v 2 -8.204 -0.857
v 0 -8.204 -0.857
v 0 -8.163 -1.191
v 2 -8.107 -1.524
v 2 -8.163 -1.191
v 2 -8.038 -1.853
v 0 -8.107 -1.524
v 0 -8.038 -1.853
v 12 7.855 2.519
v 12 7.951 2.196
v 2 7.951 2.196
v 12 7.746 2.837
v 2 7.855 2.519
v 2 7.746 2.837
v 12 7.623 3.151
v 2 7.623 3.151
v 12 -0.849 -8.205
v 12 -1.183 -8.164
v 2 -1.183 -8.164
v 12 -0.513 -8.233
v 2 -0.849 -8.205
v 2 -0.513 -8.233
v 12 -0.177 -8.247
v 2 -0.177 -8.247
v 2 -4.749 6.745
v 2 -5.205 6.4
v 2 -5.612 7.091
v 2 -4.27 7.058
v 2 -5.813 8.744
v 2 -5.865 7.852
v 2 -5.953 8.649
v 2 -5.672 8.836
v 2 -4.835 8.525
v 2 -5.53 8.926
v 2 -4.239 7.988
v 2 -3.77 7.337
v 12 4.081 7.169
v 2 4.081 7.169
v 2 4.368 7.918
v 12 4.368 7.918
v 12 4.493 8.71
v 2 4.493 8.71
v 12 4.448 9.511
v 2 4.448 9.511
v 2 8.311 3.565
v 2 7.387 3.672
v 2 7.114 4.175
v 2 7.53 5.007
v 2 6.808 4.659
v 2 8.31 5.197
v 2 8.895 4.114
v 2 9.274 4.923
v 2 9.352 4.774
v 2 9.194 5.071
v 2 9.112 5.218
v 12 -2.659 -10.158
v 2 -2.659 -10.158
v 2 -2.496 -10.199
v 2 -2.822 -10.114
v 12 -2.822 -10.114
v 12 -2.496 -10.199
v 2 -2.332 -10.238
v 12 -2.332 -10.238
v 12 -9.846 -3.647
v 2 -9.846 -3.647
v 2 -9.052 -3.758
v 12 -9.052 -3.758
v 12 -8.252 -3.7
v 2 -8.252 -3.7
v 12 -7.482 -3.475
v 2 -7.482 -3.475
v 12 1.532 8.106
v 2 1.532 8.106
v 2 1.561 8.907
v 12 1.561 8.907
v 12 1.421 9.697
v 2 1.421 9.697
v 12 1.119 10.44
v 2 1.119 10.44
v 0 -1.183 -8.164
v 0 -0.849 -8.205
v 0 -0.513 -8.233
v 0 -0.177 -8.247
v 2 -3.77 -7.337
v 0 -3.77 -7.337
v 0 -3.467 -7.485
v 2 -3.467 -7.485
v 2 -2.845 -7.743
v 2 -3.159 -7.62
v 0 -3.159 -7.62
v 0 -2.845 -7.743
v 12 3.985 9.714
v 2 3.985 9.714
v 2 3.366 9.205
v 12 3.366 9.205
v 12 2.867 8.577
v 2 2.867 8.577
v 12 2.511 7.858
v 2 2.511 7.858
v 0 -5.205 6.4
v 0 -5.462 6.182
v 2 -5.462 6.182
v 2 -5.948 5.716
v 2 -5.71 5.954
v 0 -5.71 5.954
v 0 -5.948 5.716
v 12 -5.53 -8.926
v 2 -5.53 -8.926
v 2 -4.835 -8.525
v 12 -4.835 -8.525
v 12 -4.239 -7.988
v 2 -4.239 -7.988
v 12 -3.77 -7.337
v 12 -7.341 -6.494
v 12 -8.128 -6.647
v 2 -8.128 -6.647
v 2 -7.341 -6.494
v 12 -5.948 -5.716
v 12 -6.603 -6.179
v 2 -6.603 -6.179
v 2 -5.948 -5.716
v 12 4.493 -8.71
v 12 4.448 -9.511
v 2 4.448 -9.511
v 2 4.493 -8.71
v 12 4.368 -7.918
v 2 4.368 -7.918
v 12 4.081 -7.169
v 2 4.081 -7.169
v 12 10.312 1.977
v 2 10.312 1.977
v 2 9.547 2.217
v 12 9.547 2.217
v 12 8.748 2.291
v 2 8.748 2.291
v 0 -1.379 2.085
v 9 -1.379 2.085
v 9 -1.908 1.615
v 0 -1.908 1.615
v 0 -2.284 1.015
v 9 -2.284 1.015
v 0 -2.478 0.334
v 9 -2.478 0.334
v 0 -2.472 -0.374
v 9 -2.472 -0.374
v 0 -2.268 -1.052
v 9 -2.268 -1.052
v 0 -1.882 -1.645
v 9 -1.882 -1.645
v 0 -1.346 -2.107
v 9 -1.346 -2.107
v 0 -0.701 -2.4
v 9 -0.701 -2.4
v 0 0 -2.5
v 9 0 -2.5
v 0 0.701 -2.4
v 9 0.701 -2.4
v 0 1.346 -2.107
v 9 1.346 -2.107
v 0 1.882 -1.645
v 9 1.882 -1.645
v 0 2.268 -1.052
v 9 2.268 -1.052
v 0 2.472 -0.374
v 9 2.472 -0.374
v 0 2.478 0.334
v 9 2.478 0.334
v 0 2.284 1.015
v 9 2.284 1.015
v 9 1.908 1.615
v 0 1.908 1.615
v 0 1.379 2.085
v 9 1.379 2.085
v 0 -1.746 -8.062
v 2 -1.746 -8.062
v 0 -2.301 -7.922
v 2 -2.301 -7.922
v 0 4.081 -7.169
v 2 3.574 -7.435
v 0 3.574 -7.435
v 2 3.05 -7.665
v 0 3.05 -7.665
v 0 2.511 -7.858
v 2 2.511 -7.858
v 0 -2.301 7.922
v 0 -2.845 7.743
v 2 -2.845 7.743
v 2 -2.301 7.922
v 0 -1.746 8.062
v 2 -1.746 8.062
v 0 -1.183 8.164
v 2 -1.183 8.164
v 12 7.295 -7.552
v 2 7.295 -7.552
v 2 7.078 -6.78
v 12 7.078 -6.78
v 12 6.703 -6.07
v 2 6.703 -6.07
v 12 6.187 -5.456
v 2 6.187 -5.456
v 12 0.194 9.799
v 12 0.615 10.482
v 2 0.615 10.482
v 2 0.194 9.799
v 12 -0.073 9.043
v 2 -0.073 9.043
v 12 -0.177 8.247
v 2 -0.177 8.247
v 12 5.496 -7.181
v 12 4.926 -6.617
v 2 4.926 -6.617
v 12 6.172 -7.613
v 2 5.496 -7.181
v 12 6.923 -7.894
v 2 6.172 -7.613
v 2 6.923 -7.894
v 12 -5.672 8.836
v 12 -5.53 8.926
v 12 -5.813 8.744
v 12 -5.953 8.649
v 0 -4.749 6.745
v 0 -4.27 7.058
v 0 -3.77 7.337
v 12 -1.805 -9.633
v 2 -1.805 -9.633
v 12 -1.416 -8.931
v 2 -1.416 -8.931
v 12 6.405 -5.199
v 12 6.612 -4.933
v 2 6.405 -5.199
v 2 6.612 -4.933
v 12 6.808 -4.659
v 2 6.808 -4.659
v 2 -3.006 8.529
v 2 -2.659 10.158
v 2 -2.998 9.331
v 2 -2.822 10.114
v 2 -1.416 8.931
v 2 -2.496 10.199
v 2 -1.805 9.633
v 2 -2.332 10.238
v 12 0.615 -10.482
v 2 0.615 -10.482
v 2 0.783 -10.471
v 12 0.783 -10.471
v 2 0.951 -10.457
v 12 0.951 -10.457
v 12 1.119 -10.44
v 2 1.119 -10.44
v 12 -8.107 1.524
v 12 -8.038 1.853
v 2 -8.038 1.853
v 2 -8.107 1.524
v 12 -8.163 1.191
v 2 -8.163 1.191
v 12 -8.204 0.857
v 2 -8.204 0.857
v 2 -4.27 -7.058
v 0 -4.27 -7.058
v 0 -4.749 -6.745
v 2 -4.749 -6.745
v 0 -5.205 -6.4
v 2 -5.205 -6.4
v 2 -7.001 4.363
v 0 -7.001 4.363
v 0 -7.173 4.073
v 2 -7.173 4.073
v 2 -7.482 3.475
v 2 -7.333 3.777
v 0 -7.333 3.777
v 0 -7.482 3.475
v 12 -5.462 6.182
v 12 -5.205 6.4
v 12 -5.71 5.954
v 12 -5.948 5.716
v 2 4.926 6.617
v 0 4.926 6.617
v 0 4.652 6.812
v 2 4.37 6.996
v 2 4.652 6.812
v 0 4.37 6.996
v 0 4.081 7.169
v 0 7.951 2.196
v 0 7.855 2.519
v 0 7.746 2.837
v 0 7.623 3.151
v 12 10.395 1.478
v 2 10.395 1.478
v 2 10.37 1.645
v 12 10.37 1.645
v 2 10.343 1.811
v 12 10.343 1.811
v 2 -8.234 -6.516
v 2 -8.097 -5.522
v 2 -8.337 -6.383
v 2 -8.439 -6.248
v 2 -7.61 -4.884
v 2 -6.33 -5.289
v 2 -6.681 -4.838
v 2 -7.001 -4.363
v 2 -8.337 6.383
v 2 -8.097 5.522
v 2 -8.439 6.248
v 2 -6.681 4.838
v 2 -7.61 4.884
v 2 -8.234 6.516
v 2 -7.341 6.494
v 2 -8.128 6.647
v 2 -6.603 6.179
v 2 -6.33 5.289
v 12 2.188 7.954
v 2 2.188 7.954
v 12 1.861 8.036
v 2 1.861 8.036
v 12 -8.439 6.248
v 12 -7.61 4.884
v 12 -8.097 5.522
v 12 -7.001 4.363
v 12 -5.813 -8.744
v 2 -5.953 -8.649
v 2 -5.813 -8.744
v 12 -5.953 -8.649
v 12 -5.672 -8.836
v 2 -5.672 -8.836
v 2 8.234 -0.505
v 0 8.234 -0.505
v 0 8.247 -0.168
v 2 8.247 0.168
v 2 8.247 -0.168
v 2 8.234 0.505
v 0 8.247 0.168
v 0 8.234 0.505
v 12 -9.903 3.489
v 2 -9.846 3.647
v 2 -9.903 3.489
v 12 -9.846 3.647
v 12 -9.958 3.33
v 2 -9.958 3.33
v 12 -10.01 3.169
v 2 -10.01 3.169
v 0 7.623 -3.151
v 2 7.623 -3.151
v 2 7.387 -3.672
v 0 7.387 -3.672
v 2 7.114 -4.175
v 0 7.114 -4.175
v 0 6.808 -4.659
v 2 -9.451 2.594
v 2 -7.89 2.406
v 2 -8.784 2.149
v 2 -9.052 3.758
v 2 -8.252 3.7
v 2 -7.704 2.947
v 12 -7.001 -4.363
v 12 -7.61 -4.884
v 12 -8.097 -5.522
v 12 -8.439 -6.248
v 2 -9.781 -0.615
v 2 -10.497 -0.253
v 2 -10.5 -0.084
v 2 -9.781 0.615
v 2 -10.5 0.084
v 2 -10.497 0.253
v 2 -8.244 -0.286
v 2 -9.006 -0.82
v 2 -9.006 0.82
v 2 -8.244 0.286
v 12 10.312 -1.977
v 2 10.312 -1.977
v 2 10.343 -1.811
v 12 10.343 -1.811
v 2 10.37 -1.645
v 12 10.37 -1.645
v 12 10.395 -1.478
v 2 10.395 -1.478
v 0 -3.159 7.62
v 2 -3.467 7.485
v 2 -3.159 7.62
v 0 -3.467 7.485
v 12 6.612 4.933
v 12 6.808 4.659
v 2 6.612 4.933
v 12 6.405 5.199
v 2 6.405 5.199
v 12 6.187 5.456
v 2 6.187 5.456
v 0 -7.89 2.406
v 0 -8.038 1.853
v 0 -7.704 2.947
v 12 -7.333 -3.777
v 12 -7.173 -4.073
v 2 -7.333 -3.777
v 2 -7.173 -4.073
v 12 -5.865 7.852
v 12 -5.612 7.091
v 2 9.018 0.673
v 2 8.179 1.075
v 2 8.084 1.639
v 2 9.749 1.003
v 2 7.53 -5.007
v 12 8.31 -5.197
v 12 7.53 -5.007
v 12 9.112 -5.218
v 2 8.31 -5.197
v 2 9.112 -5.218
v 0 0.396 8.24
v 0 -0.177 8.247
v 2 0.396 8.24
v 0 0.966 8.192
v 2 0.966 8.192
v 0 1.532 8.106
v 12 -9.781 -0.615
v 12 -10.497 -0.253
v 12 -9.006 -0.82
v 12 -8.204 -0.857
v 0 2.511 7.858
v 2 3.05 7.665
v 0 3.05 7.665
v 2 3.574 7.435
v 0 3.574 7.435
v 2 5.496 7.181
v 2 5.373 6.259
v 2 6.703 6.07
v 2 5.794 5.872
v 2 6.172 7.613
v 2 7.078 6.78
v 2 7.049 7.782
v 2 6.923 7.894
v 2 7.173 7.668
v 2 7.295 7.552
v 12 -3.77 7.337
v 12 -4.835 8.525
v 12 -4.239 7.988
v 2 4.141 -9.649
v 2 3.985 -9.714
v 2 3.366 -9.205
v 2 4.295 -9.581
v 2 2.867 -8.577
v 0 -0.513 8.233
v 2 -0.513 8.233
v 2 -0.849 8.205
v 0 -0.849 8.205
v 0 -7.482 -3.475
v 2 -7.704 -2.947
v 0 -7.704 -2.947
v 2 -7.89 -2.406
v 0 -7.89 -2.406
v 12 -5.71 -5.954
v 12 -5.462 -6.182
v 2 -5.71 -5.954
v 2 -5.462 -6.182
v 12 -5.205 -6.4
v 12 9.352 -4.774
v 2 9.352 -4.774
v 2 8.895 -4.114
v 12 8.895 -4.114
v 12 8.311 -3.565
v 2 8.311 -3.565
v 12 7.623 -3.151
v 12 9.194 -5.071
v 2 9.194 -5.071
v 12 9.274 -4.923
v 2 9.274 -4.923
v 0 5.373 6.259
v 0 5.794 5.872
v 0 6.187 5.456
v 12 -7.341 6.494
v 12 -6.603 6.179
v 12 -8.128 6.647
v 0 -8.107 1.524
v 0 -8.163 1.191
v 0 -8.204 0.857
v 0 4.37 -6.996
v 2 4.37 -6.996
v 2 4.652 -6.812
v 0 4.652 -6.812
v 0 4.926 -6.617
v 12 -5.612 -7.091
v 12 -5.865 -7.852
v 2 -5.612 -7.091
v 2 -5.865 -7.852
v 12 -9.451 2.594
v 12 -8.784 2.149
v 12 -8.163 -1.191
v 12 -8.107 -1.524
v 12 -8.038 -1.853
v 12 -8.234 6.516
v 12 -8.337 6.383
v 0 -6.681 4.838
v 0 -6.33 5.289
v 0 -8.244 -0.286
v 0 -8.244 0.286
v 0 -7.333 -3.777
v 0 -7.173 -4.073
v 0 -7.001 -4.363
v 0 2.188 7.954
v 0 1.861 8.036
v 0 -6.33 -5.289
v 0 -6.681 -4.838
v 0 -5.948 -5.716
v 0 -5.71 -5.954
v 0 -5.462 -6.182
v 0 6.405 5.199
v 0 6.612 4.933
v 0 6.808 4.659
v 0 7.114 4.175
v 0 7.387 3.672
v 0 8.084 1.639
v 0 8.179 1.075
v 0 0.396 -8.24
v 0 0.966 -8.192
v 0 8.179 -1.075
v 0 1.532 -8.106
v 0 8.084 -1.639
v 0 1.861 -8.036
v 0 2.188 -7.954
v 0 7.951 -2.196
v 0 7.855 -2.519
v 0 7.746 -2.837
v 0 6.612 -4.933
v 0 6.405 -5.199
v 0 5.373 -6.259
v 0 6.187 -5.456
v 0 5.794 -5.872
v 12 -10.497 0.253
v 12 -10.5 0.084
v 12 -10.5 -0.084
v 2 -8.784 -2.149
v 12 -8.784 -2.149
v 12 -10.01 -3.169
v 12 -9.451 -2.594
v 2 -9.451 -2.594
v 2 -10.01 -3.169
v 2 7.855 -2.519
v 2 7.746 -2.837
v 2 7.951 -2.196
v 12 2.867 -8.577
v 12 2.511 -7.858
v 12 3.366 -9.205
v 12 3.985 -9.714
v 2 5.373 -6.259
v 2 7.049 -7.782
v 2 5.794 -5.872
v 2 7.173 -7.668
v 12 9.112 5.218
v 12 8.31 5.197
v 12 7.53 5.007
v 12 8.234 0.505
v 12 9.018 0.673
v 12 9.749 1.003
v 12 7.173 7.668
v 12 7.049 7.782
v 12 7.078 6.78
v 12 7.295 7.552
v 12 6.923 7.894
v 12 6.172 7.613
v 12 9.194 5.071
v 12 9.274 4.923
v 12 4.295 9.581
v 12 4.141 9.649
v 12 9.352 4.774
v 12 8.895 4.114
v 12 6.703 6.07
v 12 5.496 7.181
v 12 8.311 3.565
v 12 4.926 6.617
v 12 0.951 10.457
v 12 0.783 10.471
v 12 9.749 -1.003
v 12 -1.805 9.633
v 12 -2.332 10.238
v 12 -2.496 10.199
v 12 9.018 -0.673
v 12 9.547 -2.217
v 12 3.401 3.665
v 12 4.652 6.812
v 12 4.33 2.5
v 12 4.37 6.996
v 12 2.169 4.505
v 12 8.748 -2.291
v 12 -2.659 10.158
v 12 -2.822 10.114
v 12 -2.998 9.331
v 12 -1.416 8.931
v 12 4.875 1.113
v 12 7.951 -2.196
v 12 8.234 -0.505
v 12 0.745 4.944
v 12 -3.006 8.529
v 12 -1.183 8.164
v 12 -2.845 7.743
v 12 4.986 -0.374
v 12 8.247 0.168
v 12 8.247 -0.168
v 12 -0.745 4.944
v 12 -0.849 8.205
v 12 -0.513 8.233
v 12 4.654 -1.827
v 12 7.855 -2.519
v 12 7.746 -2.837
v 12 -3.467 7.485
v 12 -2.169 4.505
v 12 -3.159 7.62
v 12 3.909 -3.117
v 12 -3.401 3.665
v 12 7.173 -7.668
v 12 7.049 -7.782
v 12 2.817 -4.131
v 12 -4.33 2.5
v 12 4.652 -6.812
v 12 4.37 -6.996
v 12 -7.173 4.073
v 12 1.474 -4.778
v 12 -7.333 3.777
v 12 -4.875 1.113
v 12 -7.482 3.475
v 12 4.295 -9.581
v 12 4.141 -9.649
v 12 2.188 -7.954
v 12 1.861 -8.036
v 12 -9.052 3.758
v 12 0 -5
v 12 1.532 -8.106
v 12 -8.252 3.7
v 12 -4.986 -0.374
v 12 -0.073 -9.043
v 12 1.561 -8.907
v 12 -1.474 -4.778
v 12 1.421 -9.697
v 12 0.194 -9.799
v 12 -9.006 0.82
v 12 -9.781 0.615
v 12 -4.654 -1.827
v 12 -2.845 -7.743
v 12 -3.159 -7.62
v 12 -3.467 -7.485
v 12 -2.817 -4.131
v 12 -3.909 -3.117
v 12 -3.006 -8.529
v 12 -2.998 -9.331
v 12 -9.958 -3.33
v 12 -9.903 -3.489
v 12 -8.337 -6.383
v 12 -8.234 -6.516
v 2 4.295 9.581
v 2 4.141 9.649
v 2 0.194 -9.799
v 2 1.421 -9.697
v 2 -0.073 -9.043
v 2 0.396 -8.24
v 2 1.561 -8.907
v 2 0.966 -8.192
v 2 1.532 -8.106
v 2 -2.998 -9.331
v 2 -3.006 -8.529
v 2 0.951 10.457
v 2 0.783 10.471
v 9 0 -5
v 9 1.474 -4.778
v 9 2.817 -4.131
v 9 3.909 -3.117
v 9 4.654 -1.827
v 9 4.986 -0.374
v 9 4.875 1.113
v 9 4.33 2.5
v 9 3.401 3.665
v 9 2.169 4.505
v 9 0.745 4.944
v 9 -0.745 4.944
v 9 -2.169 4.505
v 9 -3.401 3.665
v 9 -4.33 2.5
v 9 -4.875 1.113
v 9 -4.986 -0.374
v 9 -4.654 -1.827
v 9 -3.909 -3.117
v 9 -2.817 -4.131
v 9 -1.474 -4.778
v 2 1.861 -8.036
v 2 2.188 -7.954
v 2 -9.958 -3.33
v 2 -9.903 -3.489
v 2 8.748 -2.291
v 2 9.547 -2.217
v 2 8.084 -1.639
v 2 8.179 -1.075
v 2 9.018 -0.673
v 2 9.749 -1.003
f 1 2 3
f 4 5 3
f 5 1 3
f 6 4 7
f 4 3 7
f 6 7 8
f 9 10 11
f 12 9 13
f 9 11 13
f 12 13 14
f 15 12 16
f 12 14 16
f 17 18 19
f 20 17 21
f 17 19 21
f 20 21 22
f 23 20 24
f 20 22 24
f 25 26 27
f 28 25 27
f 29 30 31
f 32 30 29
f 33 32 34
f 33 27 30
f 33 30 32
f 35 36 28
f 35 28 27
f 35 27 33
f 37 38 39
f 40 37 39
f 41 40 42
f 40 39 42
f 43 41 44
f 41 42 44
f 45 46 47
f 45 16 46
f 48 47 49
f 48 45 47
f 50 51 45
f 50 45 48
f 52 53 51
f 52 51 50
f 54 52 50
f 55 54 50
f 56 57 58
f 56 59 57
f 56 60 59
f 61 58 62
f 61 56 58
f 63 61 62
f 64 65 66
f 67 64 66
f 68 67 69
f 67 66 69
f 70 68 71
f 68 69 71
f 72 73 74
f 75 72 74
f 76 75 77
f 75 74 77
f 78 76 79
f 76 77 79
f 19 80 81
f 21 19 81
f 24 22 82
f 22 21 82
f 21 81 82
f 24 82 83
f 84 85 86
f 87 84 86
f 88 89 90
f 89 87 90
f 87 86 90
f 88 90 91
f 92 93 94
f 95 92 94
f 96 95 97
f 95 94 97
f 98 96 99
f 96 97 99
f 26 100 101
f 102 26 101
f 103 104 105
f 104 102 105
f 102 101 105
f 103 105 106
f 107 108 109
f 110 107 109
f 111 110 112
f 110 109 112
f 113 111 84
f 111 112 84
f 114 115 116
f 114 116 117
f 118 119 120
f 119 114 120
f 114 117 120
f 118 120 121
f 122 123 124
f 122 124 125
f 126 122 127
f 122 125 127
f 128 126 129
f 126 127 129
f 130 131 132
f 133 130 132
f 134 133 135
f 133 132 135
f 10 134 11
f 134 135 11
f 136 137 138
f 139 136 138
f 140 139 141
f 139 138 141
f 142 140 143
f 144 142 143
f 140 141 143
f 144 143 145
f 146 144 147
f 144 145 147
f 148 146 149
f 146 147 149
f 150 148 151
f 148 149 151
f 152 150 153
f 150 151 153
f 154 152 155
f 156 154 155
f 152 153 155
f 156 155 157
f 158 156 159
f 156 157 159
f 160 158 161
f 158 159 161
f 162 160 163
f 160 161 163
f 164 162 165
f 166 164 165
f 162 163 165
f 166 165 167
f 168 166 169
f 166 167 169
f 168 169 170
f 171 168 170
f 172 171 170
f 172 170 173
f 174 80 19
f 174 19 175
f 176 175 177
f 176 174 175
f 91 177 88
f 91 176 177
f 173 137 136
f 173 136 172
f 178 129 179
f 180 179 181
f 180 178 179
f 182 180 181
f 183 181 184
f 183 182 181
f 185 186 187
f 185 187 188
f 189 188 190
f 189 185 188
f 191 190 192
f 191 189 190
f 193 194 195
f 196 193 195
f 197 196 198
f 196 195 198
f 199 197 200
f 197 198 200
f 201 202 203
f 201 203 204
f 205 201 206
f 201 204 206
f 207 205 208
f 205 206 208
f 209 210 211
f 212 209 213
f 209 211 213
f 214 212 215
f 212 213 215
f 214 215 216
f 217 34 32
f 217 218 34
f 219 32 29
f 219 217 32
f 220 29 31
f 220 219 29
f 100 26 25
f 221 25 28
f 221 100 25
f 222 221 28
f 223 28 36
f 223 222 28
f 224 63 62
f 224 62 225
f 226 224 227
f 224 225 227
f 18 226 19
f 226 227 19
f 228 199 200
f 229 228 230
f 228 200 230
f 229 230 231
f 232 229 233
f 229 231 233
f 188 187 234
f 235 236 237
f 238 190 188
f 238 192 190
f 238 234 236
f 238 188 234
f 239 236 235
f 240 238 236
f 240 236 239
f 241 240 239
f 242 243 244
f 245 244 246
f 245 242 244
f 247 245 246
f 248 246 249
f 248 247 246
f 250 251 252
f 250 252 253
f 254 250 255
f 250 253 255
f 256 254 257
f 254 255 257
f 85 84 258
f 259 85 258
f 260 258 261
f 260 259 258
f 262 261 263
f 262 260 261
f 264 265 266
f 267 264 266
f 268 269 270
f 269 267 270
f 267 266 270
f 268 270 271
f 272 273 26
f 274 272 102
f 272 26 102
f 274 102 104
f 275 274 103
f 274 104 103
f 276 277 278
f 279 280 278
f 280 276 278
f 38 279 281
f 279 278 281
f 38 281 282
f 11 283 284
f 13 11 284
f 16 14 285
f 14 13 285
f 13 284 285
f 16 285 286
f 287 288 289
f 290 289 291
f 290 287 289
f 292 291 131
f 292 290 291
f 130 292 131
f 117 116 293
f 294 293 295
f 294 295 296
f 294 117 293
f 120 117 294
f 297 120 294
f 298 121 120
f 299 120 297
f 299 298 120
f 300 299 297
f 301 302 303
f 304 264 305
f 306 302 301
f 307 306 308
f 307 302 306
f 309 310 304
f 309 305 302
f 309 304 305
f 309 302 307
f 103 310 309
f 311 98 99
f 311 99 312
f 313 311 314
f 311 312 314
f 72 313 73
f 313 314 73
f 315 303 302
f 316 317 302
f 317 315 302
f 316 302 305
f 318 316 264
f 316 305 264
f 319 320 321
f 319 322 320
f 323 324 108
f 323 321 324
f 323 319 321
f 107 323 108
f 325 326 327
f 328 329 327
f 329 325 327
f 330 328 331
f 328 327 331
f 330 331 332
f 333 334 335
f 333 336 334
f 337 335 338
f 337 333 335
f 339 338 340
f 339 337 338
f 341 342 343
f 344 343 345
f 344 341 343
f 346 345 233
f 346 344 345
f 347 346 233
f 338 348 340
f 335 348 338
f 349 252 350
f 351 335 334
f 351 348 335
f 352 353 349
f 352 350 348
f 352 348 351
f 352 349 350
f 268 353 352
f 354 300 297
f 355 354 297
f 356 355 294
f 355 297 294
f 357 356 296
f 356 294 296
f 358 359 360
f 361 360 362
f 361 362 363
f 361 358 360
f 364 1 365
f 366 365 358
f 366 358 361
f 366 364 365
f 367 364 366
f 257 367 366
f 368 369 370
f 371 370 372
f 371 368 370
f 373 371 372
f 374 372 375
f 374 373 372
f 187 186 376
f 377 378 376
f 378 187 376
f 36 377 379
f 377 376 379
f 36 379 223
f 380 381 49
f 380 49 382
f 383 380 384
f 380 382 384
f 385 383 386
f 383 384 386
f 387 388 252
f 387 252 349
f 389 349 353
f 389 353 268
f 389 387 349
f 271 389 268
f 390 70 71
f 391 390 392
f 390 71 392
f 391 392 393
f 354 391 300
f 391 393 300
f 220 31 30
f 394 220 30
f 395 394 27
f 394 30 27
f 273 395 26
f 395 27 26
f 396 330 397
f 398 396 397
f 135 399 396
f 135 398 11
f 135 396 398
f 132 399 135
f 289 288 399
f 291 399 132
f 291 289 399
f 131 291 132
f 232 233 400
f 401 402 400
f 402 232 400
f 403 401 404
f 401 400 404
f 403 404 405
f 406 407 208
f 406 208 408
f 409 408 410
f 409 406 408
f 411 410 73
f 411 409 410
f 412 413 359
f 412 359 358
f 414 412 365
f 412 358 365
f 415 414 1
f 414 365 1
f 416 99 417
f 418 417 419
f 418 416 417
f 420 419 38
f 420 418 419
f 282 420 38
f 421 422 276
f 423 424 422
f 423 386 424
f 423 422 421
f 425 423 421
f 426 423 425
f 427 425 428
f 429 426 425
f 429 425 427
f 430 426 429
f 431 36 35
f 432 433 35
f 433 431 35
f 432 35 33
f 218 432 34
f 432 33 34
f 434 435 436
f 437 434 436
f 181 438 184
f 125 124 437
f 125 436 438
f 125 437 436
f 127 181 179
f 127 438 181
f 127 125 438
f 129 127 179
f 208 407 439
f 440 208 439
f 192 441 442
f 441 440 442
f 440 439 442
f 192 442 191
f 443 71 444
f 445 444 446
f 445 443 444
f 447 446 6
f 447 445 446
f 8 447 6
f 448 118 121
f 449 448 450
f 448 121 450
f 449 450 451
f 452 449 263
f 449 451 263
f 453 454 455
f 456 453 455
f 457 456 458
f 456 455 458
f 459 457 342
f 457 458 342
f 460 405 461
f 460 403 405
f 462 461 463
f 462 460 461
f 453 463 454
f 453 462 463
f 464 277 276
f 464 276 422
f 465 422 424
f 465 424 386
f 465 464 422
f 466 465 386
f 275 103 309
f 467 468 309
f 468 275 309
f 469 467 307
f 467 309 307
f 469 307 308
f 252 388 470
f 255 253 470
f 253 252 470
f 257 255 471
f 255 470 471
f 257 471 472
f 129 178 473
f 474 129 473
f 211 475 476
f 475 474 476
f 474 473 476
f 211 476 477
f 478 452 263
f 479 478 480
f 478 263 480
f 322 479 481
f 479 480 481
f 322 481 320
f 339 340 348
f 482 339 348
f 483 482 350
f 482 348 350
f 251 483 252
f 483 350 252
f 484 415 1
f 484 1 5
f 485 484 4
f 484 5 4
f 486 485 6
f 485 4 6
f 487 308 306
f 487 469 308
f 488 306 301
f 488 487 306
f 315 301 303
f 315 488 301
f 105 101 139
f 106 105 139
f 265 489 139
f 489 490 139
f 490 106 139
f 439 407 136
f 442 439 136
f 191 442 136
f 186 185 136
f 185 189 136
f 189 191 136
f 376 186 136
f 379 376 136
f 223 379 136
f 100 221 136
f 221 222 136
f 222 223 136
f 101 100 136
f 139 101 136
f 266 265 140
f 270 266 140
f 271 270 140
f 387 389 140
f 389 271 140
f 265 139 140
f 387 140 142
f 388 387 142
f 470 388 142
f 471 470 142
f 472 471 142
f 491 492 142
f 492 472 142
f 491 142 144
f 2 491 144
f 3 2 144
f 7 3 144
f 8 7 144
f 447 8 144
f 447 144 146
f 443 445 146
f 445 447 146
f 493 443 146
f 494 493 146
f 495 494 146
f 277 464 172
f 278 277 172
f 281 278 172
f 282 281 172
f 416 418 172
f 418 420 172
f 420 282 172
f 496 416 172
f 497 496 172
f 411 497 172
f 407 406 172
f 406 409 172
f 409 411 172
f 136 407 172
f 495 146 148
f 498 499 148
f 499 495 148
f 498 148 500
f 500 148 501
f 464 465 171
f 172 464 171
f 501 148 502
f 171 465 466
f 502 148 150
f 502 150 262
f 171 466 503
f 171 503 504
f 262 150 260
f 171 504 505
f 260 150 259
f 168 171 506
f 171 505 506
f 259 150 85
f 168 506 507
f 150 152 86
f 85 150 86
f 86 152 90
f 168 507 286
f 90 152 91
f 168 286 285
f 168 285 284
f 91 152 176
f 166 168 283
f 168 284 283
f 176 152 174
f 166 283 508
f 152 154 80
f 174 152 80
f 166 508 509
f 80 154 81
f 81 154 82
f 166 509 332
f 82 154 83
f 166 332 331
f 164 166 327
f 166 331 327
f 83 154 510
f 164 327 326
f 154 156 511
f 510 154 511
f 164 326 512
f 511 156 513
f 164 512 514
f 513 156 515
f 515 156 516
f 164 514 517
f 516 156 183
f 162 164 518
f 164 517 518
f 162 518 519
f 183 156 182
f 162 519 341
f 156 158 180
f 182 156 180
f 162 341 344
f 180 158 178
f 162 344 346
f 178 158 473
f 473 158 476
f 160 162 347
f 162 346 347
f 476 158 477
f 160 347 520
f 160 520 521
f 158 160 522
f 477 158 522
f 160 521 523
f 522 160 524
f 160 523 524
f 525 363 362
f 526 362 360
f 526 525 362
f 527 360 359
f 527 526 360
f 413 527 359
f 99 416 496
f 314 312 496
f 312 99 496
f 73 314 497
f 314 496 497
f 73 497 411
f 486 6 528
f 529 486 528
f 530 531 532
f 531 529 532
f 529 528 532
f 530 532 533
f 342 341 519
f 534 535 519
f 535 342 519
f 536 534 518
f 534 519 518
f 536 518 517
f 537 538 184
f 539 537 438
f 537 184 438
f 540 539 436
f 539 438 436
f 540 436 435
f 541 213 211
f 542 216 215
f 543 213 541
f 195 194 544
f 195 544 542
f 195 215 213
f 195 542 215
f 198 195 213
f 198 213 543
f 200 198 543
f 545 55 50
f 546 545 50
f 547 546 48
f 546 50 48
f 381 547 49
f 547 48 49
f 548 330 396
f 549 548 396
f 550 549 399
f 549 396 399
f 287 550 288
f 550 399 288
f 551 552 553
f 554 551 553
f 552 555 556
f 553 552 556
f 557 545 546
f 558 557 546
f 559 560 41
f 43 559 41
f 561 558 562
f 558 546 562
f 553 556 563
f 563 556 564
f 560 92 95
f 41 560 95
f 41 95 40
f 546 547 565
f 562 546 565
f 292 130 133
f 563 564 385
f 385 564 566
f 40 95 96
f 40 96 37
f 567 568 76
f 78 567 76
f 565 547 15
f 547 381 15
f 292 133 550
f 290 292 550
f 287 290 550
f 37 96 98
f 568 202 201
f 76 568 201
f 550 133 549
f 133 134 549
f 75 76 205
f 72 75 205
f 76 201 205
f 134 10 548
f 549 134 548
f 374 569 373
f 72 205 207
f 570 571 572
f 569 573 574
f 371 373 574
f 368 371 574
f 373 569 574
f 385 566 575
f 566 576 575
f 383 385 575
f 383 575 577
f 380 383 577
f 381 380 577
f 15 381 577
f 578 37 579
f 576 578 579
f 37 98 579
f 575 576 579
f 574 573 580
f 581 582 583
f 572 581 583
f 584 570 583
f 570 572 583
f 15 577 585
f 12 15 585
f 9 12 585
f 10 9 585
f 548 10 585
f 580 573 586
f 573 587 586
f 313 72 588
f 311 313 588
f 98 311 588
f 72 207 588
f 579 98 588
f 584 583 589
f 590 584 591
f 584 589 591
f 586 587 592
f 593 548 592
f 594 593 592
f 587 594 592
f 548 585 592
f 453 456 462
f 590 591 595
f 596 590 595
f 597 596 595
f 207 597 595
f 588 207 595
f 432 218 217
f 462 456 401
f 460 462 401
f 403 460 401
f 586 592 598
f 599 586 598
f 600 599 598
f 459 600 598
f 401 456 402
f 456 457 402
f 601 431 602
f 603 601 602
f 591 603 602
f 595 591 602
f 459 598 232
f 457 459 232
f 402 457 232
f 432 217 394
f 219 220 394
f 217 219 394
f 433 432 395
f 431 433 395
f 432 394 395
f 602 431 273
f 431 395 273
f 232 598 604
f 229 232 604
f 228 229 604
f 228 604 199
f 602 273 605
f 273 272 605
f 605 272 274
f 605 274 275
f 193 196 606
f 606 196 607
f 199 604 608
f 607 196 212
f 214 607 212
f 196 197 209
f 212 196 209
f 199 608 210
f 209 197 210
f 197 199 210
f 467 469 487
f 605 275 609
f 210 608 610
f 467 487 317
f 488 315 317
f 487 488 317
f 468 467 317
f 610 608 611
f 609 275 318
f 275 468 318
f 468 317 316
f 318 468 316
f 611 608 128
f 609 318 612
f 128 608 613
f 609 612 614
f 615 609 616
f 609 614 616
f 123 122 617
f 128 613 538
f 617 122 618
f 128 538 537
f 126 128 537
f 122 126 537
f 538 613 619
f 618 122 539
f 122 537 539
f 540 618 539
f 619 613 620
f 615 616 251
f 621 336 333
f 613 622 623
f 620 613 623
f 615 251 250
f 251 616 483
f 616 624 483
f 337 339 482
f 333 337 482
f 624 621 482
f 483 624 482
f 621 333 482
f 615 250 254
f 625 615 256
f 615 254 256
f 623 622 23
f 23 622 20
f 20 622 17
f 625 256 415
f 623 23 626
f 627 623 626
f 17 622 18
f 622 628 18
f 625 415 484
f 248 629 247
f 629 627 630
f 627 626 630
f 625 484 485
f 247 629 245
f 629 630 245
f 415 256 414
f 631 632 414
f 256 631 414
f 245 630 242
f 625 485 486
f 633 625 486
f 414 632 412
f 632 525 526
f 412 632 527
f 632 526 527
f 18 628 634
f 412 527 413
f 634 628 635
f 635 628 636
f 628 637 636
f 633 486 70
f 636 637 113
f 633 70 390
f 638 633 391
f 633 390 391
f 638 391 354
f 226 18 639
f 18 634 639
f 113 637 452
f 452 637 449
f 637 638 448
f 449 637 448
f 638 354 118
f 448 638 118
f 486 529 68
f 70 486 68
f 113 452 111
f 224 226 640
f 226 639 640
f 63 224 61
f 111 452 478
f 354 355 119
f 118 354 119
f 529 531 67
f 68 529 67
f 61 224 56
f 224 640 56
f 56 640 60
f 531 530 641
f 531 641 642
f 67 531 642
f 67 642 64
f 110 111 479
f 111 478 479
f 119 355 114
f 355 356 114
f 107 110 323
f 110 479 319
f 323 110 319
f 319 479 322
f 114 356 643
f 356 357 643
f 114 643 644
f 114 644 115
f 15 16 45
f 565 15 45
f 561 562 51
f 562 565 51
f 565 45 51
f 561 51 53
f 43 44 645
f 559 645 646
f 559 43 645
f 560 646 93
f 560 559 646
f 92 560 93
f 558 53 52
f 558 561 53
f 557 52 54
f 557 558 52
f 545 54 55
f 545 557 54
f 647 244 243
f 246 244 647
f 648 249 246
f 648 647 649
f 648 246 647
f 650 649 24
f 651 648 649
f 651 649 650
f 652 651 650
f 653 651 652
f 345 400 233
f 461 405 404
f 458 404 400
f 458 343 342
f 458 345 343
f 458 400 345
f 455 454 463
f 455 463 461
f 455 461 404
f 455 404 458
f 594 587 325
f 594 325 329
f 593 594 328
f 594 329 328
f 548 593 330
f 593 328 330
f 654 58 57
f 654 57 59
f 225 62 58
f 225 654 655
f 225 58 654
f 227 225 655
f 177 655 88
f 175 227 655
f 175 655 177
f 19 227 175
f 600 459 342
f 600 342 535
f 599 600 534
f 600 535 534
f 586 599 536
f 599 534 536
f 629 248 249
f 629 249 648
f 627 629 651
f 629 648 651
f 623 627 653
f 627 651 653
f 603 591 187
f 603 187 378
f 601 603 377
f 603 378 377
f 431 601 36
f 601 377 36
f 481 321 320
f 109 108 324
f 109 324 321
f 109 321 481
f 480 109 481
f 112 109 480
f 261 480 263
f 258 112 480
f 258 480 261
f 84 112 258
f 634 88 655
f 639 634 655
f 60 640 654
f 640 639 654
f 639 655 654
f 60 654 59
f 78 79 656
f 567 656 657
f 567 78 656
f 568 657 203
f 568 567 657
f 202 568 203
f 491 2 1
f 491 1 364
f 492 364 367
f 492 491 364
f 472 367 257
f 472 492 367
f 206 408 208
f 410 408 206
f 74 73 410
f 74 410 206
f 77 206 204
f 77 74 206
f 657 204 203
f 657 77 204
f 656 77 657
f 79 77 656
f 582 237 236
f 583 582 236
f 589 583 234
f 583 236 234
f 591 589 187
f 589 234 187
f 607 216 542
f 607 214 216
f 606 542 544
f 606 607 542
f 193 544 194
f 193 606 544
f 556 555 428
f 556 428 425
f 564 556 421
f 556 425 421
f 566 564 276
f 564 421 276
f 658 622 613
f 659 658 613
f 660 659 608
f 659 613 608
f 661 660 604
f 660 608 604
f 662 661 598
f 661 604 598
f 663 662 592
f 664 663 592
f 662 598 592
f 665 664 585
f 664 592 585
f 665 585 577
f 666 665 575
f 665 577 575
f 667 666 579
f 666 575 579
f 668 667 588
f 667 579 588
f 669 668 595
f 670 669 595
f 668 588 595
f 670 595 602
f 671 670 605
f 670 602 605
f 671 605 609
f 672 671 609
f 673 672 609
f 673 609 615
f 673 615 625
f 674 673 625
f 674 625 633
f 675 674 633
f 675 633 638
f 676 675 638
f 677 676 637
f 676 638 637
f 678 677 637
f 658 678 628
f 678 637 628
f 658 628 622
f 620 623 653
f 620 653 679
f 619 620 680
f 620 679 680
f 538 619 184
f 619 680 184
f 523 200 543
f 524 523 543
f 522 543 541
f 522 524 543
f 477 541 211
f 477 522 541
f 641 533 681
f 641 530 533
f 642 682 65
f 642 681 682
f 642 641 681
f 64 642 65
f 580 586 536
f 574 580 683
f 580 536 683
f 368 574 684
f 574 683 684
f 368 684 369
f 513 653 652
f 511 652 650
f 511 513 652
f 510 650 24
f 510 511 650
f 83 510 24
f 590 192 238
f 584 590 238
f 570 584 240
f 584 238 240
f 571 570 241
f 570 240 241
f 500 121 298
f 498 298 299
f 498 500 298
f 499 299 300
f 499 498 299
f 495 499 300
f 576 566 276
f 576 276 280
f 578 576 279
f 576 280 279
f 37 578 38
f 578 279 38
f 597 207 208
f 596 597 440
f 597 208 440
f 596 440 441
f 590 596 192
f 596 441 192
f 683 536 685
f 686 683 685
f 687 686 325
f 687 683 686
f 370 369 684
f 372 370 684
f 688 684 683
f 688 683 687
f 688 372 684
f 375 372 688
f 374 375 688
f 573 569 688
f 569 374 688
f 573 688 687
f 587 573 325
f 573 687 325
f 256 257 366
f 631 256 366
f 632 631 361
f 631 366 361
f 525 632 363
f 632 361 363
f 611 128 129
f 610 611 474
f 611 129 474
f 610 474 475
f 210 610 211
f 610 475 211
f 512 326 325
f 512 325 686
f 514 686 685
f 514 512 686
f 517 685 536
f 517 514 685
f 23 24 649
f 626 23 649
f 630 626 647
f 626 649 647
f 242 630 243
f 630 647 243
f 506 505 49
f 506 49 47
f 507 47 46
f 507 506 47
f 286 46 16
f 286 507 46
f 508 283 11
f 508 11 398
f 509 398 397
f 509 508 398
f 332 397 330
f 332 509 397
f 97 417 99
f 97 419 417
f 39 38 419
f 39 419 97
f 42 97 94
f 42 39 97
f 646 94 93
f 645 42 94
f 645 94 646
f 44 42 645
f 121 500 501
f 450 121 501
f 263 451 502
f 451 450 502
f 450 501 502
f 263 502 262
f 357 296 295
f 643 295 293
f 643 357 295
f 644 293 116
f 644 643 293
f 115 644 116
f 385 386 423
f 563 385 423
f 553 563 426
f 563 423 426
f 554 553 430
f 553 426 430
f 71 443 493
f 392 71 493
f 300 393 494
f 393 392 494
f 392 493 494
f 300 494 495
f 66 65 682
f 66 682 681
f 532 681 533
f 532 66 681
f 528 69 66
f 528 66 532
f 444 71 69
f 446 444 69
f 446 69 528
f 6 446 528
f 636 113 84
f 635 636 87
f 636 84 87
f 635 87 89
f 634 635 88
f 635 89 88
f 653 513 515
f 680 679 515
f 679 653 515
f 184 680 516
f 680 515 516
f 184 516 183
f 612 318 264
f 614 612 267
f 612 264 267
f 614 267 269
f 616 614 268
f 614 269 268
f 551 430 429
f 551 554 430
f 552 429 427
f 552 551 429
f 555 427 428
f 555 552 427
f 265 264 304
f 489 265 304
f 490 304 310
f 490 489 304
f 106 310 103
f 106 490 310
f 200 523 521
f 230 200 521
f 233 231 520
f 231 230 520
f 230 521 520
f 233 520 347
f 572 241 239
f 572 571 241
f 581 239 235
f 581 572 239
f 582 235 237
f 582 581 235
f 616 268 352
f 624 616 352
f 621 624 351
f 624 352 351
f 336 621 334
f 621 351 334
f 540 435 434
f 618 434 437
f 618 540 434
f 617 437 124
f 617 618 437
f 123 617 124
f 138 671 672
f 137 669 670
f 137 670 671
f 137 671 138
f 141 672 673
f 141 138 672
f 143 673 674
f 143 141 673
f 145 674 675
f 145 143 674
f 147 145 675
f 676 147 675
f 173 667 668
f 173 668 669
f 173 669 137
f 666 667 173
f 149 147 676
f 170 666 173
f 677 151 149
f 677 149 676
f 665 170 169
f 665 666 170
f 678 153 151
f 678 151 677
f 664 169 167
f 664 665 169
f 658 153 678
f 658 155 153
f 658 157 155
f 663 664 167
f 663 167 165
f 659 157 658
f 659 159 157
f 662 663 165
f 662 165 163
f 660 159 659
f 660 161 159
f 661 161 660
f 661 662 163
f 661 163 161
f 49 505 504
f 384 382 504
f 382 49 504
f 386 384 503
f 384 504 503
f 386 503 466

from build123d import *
from build123d.topology import SkipClean

# Parameters (mm, degrees)
BASPROSKE_W         = 12
BASPROSKE_H         = 10.5
TOOTHCUT_DEPTH      = 20.091883092
TEETHCUTS_COUNT     = 19
BORSKE_R            = 2.5
BORE_DEPTH          = 50.0000508
SKETCH1_R           = 5
CUT_EXTRUDE1_DEPTH  = 3
BOSS_EXTRUDE1_DEPTH = 9
SKETCH3_R           = 10.5
SKETCH3_R_2         = 8.249
CUT_EXTRUDE2_DEPTH  = 2


with BuildPart() as part:
    # BasProSke → Base-Revolve (revolve)
    with BuildSketch(Plane(origin=(0, 0, 0), x_dir=(1, 0, 0), z_dir=(0, 1, 0)), mode=Mode.PRIVATE) as base_revolve_sk:
        with Locations((6, 5.25)):
            Rectangle(BASPROSKE_W, BASPROSKE_H)
    revolve(base_revolve_sk.sketch.rotate(Axis((-10, 0, 0), (1, 0, 0)), 180), axis=Axis((-10, 0, 0), (1, 0, 0)))

    # TooCutSke → ToothCut (cut, through all)
    with BuildSketch(Plane(origin=(0, 0, 0), x_dir=(0, 0, -1), z_dir=(1, 0, 0))):
        with BuildLine():
            ThreePointArc((0.505024765, 8.233526036), (0, 8.249), (-0.505024765, 8.233526036))
            ThreePointArc((-0.505024765, 8.233526036), (-0.825185426, 9.406360648), (-1.499357972, 10.41805984))
            ThreePointArc((-1.499357972, 10.41805984), (0, 10.5254), (1.499357972, 10.41805984))
            ThreePointArc((1.499357972, 10.41805984), (0.825185426, 9.406360648), (0.505024765, 8.233526036))
        make_face()
    toothcut = extrude(amount=TOOTHCUT_DEPTH, mode=Mode.SUBTRACT)

    # TeethCuts: ToothCut ×19 about axis
    teethcuts_axis = Axis((0, 0, 0), (1, 0, 0))
    for i in range(1, TEETHCUTS_COUNT):
        add(toothcut.rotate(teethcuts_axis, i * 360 / TEETHCUTS_COUNT), mode=Mode.SUBTRACT)

    # BorSke → Bore (cut, symmetric)
    with BuildSketch(Plane(origin=(0, 0, 0), x_dir=(0, 0, -1), z_dir=(1, 0, 0))):
        with Locations(Location((0, 0, 0), (0, 0, 180))):
            Circle(BORSKE_R)
    extrude(amount=BORE_DEPTH, both=True, mode=Mode.SUBTRACT)

    # Sketch1 → Cut-Extrude1 (cut)
    with BuildSketch(Plane(origin=(12, 0, 0), x_dir=(0, 0, -1), z_dir=(1, 0, 0))):
        Circle(SKETCH1_R)
    extrude(amount=-CUT_EXTRUDE1_DEPTH, mode=Mode.SUBTRACT)

    # Sketch2 → Boss-Extrude1 (add)
    with BuildSketch(Plane(origin=(9, 0, 0), x_dir=(0, 0, -1), z_dir=(1, 0, 0))):
        with BuildLine():
            Line((-2.085372664, -1.378847653), (-2.085372664, 1.378847653))
            ThreePointArc((-2.085372664, 1.378847653), (-2.5, 0), (-2.085372664, -1.378847653))
        make_face()
    extrude(amount=-BOSS_EXTRUDE1_DEPTH)

    # Sketch3 → Cut-Extrude2 (cut)
    with SkipClean():  # the faces are left unmerged after this step: merging them gives an invalid solid
        with BuildSketch(Plane.ZY):
            Circle(SKETCH3_R)
            with Locations(Location((0, 0, 0), (0, 0, 358.773146294))):
                Circle(SKETCH3_R_2, mode=Mode.SUBTRACT)
        extrude(amount=-CUT_EXTRUDE2_DEPTH, mode=Mode.SUBTRACT)


solid = part.part
